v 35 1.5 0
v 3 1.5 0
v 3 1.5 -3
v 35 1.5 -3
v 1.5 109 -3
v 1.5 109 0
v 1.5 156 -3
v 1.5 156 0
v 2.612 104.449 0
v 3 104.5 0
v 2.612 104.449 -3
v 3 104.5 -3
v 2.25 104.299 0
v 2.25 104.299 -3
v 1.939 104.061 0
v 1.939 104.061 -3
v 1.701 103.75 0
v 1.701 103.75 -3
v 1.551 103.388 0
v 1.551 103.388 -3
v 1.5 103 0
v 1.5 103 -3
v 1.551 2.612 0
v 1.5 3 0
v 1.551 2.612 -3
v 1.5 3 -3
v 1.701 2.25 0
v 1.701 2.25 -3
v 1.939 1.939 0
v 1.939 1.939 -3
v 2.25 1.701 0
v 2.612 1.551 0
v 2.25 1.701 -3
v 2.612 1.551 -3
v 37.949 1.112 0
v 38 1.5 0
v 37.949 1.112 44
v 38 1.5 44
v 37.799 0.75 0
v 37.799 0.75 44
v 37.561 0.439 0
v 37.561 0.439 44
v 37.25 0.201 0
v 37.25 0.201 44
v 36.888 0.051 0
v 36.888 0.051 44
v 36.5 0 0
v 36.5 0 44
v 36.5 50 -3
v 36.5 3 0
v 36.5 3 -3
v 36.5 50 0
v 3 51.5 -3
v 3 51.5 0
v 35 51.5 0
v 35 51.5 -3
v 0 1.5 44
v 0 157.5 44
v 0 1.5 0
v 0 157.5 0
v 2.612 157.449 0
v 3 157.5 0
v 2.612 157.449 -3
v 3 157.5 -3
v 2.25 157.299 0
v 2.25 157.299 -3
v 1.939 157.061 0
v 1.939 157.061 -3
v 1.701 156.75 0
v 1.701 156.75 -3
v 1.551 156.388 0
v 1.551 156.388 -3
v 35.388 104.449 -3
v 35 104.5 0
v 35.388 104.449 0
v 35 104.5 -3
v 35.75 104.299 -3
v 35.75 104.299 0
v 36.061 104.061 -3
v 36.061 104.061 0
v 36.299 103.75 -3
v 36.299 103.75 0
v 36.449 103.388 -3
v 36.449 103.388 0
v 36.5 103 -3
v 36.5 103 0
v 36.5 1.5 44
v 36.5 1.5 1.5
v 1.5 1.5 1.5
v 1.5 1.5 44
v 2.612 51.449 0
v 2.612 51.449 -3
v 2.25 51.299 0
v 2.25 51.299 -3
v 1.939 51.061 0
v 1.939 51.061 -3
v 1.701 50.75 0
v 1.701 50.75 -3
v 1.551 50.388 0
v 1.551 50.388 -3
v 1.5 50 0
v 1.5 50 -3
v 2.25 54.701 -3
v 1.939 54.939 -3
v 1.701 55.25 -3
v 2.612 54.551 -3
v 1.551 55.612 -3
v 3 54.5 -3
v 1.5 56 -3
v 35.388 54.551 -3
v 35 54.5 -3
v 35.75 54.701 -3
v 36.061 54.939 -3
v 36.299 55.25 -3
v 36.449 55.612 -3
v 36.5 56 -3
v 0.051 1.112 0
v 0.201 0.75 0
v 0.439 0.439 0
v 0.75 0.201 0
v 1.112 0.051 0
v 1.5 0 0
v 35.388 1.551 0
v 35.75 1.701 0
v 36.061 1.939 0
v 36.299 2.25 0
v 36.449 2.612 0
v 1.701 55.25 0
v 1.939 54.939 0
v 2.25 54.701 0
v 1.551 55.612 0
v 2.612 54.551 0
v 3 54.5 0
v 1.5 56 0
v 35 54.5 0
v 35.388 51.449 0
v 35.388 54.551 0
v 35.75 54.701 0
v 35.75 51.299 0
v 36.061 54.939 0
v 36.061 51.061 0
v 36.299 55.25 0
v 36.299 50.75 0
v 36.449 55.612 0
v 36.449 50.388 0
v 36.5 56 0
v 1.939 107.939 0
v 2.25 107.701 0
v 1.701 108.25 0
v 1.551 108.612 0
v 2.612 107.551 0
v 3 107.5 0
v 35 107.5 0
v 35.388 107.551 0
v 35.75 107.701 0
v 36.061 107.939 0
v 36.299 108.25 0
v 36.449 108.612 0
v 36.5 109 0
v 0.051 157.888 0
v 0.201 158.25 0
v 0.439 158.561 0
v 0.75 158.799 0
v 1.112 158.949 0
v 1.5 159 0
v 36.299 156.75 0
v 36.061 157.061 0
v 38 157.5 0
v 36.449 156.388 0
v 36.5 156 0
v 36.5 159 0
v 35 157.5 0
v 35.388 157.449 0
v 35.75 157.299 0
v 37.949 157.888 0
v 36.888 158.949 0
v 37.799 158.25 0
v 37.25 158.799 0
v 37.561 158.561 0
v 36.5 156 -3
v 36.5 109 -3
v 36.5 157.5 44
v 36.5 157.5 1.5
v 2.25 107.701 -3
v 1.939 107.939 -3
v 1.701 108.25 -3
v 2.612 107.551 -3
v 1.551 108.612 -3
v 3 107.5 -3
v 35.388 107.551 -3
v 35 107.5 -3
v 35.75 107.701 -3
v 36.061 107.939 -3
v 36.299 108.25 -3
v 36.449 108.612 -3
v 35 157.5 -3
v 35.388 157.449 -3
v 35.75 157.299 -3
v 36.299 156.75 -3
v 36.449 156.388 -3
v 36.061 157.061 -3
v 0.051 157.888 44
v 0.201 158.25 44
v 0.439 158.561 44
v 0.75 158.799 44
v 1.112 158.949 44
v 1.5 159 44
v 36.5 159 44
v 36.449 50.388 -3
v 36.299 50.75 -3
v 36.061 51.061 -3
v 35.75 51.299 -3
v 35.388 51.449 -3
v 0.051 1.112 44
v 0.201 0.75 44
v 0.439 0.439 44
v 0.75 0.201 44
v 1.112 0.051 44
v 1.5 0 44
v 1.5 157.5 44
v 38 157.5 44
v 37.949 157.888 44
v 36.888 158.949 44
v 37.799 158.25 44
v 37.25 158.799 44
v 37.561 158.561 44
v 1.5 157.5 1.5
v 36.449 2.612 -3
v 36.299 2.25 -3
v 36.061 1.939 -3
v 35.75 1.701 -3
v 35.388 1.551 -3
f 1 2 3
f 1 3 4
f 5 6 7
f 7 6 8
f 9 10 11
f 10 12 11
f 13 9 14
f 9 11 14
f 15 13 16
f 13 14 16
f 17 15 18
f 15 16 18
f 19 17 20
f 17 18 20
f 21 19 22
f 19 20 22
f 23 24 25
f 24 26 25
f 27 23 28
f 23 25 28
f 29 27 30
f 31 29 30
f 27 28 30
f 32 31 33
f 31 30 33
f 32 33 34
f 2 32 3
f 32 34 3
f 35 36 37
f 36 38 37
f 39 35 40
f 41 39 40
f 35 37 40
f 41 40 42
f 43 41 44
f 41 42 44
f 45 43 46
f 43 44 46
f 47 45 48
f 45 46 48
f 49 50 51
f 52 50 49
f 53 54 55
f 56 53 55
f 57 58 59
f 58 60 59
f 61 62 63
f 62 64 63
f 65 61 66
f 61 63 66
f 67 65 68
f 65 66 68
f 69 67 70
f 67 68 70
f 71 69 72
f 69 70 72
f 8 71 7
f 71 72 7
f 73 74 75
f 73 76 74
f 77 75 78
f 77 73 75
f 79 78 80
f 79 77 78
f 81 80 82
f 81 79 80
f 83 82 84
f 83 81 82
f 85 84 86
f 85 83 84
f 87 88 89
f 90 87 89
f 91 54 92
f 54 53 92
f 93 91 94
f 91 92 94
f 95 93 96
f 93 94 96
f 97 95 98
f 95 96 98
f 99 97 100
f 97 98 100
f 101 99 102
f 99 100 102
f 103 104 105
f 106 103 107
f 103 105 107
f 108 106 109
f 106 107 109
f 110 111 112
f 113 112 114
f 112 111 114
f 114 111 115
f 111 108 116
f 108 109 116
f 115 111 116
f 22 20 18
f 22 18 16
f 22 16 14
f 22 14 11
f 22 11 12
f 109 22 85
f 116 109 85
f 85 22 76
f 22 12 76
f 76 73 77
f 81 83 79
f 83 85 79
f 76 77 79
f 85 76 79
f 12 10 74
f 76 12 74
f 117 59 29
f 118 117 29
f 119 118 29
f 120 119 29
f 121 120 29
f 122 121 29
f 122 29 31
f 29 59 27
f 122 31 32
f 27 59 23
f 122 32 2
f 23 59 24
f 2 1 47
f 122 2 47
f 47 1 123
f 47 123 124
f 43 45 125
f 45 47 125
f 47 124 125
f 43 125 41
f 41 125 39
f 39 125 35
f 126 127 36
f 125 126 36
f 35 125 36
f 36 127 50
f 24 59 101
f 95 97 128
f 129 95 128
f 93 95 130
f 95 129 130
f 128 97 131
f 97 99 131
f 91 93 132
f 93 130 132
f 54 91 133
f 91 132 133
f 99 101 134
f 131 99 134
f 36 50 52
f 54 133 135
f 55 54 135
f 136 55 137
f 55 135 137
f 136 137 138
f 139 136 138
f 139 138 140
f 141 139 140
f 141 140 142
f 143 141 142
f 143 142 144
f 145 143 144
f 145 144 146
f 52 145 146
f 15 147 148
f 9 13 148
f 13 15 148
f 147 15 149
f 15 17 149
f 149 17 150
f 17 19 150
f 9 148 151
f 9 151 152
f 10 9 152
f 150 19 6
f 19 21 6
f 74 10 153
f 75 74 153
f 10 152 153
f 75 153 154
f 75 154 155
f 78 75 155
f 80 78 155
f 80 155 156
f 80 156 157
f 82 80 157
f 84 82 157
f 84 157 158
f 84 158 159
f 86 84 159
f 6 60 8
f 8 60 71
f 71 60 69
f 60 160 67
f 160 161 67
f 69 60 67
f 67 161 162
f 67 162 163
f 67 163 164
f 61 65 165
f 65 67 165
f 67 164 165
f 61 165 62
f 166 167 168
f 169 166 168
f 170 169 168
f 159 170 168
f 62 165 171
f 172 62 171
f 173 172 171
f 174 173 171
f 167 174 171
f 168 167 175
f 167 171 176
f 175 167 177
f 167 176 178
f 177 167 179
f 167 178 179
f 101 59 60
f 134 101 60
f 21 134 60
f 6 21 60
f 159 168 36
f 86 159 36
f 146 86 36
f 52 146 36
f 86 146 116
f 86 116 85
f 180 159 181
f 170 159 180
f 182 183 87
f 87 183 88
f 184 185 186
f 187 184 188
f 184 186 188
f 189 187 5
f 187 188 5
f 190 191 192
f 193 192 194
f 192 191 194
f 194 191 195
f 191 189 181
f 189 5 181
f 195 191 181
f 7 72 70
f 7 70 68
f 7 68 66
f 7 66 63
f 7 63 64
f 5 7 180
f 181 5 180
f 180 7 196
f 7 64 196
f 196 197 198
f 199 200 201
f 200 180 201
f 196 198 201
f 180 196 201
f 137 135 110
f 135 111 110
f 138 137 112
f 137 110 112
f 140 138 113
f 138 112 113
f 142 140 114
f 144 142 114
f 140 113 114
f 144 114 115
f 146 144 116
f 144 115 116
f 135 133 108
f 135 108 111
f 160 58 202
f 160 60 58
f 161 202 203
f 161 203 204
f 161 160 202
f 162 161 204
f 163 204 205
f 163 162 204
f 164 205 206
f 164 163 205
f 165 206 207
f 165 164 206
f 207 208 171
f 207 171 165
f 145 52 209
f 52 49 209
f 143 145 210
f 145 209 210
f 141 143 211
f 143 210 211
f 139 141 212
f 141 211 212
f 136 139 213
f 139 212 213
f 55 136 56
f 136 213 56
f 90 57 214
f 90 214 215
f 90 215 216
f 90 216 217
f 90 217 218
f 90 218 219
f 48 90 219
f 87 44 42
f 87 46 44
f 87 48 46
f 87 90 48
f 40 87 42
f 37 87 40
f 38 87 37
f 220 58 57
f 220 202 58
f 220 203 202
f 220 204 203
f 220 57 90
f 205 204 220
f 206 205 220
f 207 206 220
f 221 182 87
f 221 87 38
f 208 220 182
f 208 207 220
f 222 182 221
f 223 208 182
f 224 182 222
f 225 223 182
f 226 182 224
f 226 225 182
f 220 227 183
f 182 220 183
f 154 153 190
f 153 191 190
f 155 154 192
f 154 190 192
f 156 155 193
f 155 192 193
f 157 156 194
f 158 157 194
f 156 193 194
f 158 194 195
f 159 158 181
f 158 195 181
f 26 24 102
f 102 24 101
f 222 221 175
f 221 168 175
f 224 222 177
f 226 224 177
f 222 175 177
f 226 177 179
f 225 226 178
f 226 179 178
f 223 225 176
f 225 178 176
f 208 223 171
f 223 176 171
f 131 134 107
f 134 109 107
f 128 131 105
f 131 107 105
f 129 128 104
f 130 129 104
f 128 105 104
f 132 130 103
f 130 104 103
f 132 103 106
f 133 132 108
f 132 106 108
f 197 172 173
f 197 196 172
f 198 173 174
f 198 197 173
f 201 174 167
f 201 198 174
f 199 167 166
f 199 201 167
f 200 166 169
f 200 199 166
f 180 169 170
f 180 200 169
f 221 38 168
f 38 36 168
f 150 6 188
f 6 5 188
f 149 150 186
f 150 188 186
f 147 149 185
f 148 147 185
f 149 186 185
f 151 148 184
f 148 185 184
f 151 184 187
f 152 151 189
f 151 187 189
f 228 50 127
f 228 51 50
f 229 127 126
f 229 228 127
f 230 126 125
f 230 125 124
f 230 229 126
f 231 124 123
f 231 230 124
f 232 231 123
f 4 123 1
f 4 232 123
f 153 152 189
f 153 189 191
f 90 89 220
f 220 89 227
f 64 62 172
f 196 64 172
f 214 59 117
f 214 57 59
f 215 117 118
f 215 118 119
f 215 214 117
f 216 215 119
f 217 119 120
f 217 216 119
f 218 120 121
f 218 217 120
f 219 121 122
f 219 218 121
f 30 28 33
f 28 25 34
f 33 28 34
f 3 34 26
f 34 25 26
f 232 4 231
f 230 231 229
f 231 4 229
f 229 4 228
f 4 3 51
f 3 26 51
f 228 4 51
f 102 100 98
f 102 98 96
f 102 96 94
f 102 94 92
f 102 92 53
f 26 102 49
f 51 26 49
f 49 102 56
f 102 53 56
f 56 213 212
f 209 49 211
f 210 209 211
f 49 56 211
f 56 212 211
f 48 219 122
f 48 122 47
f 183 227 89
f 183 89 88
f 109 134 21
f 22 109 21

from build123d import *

# Parameters (mm, degrees)
F0_W     = 35
F0_H     = 50
F1_DEPTH = 3
F0_H_2   = 1.5
F2_DEPTH = 1.5
F3_DEPTH = 44
F4_R     = 1.5


with BuildPart() as f1:
    # F0 (on Top) → F1 (new body)
    with BuildSketch(Plane.XY):
        with Locations((19, 132.5)):
            Rectangle(F0_W, F0_H)
        with Locations((19, 79.5)):
            Rectangle(F0_W, F0_H)
        with Locations((19, 26.5)):
            Rectangle(F0_W, F0_H)
    extrude(amount=-F1_DEPTH)

    # F0 (on Top) → F2 (join)
    with BuildSketch(Plane.XY):
        Polygon((0, 159), (0, 106), (1.5, 106), (1.5, 107.5), (1.5, 157.5), (36.5, 157.5), (36.5, 107.5), (36.5, 106), (38, 106), (38, 159), align=None)
        with Locations((19, 132.5)):
            Rectangle(F0_W, F0_H)
        with Locations((19, 105.25)):
            Rectangle(F0_W, F0_H_2)
        with Locations((19, 106.75)):
            Rectangle(F0_W, F0_H_2)
        Polygon((36.5, 53), (38, 53), (38, 106), (36.5, 106), (36.5, 104.5), (36.5, 54.5), align=None)
        Polygon((0, 106), (0, 53), (1.5, 53), (1.5, 54.5), (1.5, 104.5), (1.5, 106), align=None)
        with Locations((19, 79.5)):
            Rectangle(F0_W, F0_H)
        with Locations((19, 53.75)):
            Rectangle(F0_W, F0_H_2)
        with Locations((19, 52.25)):
            Rectangle(F0_W, F0_H_2)
        with Locations((19, 26.5)):
            Rectangle(F0_W, F0_H)
        Polygon((0, 53), (0, 0), (38, 0), (38, 53), (36.5, 53), (36.5, 51.5), (36.5, 1.5), (1.5, 1.5), (1.5, 51.5), (1.5, 53), align=None)
    extrude(amount=F2_DEPTH)

    # F0 (on Top) → F3 (join)
    with BuildSketch(Plane.XY):
        Polygon((0, 159), (0, 106), (1.5, 106), (1.5, 107.5), (1.5, 157.5), (36.5, 157.5), (36.5, 107.5), (36.5, 106), (38, 106), (38, 159), align=None)
        Polygon((0, 106), (0, 53), (1.5, 53), (1.5, 54.5), (1.5, 104.5), (1.5, 106), align=None)
        Polygon((36.5, 53), (38, 53), (38, 106), (36.5, 106), (36.5, 104.5), (36.5, 54.5), align=None)
        Polygon((0, 53), (0, 0), (38, 0), (38, 53), (36.5, 53), (36.5, 51.5), (36.5, 1.5), (1.5, 1.5), (1.5, 51.5), (1.5, 53), align=None)
    extrude(amount=F3_DEPTH)

    # F4
    f4_edges = [f1.edges().sort_by_distance(p)[0] for p in [
        (0, 159, 22),
        (38, 159, 22),
        (36.5, 157.5, -1.5),
        (1.5, 157.5, -1.5),
        (36.5, 107.5, -1.5),
        (1.5, 107.5, -1.5),
        (1.5, 104.5, -1.5),
        (36.5, 104.5, -1.5),
        (36.5, 54.5, -1.5),
        (36.5, 51.5, -1.5),
        (1.5, 51.5, -1.5),
        (1.5, 54.5, -1.5),
        (36.5, 1.5, -1.5),
        (38, 0, 22),
        (1.5, 1.5, -1.5),
        (0, 0, 22),
    ]]
    fillet(f4_edges, radius=F4_R)


solid = f1.part
